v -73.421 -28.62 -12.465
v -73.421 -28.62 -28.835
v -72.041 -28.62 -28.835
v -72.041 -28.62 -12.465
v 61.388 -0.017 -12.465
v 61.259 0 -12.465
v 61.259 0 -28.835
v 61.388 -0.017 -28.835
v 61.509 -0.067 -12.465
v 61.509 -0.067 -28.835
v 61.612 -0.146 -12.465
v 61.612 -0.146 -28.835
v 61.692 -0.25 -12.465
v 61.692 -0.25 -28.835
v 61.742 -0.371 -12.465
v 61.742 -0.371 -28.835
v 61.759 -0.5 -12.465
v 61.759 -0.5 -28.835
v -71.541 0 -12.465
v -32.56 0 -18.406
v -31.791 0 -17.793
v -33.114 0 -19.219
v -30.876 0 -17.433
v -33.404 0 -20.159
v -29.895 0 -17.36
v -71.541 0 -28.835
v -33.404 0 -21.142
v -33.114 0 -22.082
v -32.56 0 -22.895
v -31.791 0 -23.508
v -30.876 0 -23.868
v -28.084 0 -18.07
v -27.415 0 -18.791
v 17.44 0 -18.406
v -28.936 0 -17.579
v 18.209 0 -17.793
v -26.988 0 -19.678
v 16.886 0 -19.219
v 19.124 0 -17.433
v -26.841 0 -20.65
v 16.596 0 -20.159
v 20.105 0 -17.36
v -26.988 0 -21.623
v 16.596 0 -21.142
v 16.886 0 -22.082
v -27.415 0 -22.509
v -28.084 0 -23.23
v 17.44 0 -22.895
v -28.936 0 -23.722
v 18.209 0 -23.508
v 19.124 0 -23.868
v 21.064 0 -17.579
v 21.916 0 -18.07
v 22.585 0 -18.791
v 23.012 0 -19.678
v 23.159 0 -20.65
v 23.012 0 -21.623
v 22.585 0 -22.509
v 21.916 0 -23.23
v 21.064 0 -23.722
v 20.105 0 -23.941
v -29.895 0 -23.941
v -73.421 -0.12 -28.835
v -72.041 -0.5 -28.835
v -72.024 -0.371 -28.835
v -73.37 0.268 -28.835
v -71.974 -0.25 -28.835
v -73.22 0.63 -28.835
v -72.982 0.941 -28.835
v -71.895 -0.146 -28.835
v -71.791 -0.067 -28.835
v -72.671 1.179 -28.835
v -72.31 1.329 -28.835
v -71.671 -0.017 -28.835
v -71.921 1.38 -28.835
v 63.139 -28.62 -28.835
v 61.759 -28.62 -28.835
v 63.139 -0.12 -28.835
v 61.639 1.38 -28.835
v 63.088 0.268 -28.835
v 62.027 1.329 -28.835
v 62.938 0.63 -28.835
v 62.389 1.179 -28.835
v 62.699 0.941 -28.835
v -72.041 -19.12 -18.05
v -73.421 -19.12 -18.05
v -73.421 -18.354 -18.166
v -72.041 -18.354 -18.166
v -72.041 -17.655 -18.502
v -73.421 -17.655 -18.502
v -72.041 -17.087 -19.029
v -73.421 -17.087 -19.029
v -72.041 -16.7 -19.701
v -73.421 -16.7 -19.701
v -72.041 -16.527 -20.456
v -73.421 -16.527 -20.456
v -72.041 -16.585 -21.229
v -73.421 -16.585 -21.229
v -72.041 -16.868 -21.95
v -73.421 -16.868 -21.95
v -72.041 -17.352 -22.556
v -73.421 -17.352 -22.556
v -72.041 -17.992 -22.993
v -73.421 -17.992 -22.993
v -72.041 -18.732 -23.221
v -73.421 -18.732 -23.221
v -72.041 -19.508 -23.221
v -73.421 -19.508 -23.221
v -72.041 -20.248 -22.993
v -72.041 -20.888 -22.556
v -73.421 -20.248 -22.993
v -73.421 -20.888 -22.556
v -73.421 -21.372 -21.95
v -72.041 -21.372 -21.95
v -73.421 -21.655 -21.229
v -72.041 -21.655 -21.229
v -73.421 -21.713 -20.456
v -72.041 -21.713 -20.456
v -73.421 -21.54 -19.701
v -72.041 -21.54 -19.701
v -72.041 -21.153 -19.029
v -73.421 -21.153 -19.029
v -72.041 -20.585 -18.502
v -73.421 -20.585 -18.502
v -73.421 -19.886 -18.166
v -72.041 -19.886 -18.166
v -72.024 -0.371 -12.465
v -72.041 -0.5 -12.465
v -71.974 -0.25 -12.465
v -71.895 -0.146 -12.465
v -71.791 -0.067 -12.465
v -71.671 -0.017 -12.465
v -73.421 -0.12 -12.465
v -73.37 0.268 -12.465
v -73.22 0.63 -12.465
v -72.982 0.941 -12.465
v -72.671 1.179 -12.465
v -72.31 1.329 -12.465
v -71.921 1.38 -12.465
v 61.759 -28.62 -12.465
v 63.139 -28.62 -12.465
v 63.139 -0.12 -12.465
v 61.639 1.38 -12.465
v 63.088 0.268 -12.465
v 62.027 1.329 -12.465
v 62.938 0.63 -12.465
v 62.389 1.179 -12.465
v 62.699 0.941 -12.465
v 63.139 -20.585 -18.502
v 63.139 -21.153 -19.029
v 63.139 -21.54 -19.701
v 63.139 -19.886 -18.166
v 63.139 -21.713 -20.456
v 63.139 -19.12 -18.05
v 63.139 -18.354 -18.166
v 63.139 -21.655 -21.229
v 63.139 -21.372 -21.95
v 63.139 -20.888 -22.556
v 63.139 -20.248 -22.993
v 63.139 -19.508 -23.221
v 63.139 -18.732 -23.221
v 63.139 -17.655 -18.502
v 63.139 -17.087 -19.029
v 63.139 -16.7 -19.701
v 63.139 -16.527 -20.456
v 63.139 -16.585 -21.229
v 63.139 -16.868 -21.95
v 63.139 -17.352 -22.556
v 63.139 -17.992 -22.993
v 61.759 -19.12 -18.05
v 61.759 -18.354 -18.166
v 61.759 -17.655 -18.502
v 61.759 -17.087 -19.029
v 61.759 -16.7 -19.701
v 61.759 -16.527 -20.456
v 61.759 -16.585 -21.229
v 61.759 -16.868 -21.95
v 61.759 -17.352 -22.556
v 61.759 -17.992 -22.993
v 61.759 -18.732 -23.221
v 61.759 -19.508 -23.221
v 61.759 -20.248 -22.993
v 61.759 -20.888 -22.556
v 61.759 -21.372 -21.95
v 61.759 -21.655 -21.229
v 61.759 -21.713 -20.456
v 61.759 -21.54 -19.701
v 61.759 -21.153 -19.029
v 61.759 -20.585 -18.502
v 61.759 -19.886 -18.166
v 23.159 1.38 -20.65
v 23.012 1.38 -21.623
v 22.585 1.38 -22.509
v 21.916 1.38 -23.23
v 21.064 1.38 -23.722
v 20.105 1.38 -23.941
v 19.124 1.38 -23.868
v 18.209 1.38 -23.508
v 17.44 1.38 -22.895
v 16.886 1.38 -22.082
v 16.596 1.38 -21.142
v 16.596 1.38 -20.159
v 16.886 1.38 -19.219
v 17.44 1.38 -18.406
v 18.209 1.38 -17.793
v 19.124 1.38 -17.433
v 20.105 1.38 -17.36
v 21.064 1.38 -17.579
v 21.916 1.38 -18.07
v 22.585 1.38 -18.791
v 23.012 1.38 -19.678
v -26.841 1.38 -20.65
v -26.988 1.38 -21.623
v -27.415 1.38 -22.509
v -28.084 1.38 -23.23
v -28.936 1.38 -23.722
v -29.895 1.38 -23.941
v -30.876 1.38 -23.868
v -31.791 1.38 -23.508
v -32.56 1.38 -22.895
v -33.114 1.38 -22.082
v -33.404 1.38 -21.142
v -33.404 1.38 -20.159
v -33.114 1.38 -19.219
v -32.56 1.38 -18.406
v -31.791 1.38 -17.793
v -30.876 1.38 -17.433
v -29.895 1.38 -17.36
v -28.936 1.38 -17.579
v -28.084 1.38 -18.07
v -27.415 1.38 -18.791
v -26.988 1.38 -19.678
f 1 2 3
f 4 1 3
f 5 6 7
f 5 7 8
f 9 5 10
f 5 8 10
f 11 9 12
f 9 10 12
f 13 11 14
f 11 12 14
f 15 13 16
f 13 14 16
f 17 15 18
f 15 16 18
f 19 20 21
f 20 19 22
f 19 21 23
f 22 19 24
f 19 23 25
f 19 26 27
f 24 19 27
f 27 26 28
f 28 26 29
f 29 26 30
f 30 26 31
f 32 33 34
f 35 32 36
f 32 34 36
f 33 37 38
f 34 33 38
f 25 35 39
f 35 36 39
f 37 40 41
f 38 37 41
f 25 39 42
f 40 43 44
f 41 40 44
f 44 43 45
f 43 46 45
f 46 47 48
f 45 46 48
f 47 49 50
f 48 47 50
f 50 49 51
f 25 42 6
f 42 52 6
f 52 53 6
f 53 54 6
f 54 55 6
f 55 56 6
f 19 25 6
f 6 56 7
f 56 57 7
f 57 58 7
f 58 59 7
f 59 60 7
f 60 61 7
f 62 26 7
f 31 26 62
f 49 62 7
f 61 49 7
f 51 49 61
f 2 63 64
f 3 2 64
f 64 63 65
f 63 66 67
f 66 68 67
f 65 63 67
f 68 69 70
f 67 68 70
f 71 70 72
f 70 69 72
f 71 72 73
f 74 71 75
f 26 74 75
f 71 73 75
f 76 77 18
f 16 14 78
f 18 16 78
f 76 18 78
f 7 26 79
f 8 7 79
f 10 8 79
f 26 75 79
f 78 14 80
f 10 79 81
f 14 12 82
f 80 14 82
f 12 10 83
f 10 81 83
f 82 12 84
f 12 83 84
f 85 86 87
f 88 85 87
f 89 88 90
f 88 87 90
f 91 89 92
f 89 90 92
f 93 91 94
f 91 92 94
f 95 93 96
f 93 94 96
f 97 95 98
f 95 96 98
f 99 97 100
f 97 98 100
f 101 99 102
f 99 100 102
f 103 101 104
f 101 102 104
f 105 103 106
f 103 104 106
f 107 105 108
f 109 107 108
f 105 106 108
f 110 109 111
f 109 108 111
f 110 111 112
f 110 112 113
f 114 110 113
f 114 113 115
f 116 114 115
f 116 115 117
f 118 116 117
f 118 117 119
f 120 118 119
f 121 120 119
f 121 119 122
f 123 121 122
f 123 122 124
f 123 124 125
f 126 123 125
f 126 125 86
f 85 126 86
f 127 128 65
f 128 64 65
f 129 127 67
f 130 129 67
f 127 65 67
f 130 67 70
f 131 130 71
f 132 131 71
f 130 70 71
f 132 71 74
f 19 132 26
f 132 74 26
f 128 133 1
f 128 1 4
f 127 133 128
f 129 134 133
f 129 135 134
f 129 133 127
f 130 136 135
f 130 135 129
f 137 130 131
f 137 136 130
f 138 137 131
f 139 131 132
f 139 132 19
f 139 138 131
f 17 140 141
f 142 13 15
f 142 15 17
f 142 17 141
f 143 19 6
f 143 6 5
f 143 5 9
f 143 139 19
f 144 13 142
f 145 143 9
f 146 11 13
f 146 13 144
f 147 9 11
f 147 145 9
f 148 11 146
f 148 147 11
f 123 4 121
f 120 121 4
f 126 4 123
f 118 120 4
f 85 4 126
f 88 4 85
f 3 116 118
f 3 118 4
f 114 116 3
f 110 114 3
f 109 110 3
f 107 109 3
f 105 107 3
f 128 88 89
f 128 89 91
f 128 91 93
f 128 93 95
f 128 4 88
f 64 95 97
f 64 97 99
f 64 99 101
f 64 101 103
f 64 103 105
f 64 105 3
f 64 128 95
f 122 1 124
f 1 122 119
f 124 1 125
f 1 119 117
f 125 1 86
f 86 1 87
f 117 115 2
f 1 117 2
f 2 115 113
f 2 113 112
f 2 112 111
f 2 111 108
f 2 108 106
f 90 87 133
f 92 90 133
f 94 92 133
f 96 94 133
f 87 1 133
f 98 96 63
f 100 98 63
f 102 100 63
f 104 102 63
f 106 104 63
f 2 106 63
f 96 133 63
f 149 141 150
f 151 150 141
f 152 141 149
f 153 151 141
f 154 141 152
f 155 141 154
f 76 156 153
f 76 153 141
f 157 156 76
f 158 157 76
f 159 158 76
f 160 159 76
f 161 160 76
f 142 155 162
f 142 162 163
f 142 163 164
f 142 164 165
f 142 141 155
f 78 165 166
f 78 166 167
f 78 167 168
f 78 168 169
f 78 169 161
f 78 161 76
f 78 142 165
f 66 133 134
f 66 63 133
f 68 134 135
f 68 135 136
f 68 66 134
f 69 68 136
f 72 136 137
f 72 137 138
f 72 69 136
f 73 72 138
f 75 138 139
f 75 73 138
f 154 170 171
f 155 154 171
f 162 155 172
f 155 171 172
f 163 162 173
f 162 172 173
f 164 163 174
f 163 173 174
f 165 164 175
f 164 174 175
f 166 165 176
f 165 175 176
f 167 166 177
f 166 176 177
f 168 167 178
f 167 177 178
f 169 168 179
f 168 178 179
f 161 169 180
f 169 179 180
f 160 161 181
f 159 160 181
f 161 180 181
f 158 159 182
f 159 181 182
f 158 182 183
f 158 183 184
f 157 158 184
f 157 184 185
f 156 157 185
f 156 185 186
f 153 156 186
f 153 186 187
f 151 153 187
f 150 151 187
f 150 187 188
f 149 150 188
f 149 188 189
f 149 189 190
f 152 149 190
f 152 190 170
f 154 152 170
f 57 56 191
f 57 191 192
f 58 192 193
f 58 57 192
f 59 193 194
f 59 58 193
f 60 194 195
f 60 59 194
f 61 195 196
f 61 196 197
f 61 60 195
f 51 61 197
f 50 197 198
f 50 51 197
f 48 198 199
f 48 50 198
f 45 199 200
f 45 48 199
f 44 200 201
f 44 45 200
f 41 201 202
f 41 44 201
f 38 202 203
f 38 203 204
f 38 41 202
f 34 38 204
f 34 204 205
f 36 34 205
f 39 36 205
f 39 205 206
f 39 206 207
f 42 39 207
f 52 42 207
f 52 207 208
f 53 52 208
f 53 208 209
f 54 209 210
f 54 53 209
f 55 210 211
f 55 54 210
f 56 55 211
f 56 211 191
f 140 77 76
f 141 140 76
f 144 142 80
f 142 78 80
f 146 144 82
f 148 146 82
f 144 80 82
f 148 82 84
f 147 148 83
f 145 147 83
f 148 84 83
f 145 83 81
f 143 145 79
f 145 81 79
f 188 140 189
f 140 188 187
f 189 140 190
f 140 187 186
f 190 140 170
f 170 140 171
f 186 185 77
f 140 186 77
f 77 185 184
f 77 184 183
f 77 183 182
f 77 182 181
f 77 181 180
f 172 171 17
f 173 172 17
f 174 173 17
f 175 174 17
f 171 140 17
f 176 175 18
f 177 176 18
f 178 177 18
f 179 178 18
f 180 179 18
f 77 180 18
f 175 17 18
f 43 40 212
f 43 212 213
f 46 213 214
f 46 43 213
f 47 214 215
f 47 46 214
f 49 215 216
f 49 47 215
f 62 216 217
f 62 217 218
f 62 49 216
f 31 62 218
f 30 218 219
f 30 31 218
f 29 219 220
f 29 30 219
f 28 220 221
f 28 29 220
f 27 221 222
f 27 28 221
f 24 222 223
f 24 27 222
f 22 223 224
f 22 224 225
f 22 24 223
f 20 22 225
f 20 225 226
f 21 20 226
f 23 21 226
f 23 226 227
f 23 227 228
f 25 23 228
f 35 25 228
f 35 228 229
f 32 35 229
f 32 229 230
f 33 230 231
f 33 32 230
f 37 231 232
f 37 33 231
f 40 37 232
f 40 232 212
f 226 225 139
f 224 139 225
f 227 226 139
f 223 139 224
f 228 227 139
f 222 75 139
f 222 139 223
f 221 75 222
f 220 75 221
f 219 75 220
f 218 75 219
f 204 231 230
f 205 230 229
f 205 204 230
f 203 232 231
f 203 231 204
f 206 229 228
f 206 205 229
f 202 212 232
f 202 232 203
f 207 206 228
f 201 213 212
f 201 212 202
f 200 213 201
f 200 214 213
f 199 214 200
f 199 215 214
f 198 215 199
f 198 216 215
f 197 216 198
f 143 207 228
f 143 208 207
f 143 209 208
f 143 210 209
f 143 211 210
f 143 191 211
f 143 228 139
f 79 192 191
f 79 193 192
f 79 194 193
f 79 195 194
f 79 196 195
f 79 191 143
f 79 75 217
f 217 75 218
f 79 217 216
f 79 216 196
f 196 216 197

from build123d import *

# Parameters (mm, degrees)
SKETCH1_W           = 133.8
SKETCH1_H           = 16.37
SKETCH1_R           = 3.3
BOSS_EXTRUDE1_DEPTH = 1.38
SKETCH2_W           = 1.38
SKETCH2_H           = 16.37
BOSS_EXTRUDE2_DEPTH = 30
FILLET1_R           = 1.5
FILLET2_R           = 0.5
SKETCH3_R           = 2.6
CUT_EXTRUDE1_DEPTH  = 137.56


with BuildPart() as part:
    # Sketch1 → Boss-Extrude1 (new body)
    with BuildSketch(Plane(origin=(0, 0, 0), x_dir=(1, 0, 0), z_dir=(0, 1, 0))):
        with Locations((-5.141278074, 20.650419702)):
            Rectangle(SKETCH1_W, SKETCH1_H)
        with Locations((-30.141278074, 20.650419702)):
            Circle(SKETCH1_R, mode=Mode.SUBTRACT)
        with Locations((19.858721926, 20.650419702)):
            Circle(SKETCH1_R, mode=Mode.SUBTRACT)
    extrude(amount=BOSS_EXTRUDE1_DEPTH)

    # Sketch2 → Boss-Extrude2 (add)
    with BuildSketch(Plane(origin=(0, 1.38, 0), x_dir=(1, 0, 0), z_dir=(0, 1, 0))):
        with Locations((-72.731278074, 20.650419702)):
            Rectangle(SKETCH2_W, SKETCH2_H)
        with Locations((62.448721926, 20.650419702)):
            Rectangle(SKETCH2_W, SKETCH2_H)
    extrude(amount=-BOSS_EXTRUDE2_DEPTH)

    # Fillet1
    fillet1_edges = [part.edges().sort_by_distance(p)[0] for p in [
        (-73.421278074, 1.38, -20.650419702),
        (63.138721926, 1.38, -20.650419702),
    ]]
    fillet(fillet1_edges, radius=FILLET1_R)

    # Fillet2
    fillet2_edges = [part.edges().sort_by_distance(p)[0] for p in [
        (-72.041278074, 0, -20.650419702),
        (61.758721926, 0, -20.650419702),
    ]]
    fillet(fillet2_edges, radius=FILLET2_R)

    # Sketch3 → Cut-Extrude1 (cut, through all)
    with BuildSketch(Plane.ZY.offset(73.421278074)):
        with Locations((-20.650419702, -19.12)):
            Circle(SKETCH3_R)
    extrude(amount=-CUT_EXTRUDE1_DEPTH, mode=Mode.SUBTRACT)


solid = part.part
